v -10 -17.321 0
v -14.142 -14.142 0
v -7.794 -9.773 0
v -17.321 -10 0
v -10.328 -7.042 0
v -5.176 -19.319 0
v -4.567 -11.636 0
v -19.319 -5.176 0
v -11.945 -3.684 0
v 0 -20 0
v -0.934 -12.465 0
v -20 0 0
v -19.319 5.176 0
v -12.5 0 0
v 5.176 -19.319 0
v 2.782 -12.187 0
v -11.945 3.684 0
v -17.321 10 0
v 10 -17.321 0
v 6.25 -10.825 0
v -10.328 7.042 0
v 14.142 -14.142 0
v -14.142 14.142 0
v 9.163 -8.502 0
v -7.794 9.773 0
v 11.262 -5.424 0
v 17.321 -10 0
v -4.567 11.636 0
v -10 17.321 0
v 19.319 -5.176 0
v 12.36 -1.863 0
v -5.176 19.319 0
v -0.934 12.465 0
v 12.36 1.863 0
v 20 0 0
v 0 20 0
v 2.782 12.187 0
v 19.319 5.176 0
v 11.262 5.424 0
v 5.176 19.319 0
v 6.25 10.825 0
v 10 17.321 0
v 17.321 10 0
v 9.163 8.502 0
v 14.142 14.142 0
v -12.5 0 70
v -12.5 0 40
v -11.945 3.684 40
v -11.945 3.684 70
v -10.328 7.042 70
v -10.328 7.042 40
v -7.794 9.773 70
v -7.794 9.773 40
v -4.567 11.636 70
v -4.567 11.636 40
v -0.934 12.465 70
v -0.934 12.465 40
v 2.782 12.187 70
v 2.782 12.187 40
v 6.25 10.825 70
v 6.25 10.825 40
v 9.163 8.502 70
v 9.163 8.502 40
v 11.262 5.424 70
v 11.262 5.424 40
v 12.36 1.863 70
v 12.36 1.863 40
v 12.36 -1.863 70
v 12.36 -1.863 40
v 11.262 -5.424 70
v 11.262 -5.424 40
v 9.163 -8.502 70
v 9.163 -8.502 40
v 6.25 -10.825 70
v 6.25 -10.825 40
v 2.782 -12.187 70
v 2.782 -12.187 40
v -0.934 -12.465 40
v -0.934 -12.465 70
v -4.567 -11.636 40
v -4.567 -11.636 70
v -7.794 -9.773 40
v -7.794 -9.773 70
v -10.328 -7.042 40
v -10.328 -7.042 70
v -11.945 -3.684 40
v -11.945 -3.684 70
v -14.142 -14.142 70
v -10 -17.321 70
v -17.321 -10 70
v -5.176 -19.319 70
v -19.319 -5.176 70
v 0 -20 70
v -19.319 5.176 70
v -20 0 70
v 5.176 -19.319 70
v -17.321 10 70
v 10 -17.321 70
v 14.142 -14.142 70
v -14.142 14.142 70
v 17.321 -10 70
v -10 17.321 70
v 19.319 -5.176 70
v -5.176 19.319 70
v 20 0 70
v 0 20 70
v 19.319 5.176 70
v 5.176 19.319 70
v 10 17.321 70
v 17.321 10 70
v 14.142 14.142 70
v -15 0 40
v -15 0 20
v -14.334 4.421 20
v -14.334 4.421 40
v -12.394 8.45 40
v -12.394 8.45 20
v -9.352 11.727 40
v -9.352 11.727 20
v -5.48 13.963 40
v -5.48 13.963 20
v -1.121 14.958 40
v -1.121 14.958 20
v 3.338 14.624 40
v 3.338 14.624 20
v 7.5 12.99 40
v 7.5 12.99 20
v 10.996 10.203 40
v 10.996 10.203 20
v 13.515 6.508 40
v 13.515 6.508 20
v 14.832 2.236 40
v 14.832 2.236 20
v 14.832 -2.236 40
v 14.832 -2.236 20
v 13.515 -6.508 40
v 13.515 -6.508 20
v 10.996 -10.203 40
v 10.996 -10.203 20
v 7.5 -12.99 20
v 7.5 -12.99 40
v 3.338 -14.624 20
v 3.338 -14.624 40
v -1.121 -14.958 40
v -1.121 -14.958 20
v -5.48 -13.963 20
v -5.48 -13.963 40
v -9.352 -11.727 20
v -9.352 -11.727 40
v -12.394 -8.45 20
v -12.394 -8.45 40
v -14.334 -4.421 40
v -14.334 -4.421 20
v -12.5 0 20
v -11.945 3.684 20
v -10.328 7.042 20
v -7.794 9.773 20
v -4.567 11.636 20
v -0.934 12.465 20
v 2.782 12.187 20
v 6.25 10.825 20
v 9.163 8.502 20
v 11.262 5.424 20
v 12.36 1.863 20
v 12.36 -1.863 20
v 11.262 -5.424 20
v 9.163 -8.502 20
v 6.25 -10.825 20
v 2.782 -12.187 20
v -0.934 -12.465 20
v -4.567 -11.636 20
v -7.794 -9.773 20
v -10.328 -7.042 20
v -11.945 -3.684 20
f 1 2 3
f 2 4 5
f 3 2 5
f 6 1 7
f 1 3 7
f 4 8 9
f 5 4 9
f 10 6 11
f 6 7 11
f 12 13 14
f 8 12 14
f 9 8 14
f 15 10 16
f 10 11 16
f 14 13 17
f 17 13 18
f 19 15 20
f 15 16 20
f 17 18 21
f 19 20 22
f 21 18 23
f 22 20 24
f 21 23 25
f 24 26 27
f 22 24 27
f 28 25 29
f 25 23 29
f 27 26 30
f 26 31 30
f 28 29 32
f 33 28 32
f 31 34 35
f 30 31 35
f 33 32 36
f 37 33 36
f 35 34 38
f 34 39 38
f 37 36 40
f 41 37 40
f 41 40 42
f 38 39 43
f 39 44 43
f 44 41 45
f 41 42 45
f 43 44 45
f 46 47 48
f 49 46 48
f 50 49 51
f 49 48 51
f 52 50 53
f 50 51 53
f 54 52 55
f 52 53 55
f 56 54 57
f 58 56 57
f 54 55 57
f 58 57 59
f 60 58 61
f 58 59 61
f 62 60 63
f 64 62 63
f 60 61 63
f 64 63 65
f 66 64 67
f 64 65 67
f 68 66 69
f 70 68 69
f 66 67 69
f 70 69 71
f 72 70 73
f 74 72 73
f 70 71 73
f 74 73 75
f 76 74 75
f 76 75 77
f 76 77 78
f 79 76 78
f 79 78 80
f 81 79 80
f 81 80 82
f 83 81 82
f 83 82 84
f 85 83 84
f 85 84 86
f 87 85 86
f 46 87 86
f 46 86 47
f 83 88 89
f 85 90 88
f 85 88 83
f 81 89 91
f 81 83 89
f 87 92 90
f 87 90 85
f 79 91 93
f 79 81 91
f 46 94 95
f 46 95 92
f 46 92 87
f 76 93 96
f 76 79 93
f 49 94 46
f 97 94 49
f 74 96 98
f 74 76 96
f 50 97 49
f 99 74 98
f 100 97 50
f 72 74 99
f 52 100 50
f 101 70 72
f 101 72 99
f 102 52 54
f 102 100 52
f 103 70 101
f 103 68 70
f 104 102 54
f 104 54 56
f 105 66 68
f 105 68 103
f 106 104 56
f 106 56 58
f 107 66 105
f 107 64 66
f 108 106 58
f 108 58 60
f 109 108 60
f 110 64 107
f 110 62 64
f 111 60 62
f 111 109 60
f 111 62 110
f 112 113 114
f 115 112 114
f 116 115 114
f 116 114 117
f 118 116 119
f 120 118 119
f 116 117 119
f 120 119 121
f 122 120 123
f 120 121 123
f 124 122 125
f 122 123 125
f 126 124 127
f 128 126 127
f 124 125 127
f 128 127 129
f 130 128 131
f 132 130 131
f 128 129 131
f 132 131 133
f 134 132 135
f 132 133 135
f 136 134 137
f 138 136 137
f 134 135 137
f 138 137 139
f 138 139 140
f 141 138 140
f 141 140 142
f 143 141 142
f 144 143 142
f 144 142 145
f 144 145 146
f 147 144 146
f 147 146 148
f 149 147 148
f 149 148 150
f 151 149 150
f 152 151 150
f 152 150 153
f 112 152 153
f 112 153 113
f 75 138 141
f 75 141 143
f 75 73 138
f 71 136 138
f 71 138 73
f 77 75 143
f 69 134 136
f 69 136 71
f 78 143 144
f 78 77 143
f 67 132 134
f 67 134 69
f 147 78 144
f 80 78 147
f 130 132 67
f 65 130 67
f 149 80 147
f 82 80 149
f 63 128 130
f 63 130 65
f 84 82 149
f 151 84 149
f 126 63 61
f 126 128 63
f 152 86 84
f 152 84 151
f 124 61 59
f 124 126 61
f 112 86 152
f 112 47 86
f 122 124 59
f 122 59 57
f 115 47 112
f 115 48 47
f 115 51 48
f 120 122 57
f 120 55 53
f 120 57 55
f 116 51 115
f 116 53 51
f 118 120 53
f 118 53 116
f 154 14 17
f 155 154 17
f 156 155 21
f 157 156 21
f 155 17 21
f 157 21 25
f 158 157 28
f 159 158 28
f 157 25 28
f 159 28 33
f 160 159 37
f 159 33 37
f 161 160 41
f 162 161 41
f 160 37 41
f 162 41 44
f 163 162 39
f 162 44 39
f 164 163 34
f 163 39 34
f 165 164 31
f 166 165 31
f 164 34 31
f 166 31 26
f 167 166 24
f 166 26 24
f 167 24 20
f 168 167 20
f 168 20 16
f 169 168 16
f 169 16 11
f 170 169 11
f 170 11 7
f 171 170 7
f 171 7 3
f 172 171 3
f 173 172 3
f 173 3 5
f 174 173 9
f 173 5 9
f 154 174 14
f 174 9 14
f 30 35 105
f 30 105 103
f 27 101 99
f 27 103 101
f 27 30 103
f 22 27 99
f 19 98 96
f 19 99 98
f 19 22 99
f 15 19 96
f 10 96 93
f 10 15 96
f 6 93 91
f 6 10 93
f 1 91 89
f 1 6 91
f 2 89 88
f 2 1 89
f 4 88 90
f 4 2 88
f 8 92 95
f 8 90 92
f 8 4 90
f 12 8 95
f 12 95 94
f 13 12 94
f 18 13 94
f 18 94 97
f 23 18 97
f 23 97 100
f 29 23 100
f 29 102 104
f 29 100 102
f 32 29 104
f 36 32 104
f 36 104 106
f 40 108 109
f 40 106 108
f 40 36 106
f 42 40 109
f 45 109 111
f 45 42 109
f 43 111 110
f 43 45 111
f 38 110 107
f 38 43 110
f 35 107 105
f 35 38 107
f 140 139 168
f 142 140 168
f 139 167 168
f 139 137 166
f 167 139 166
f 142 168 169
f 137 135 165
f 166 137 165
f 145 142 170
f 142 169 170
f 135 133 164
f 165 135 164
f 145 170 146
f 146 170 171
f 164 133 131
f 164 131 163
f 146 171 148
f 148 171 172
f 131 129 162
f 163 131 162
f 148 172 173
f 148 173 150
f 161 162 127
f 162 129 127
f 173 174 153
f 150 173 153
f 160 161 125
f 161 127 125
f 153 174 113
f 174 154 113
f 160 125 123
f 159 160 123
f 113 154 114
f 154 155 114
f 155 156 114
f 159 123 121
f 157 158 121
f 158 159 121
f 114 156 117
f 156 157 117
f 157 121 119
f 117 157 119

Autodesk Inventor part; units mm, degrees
ref_plane "YZ Plane" through (0, 0, 0) normal (1, 0, 0) x (0, 1, 0)
ref_plane "XZ Plane" through (0, 0, 0) normal (0, 1, 0) x (-1, 0, 0)
ref_plane "XY Plane" through (0, 0, 0) normal (0, 0, 1) x (1, 0, 0)
sketch "스케치1" plane through (0, 0, 0) normal (0, 0, 1) x (1, 0, 0)
  circle A0 centre (0, 0) radius 20
  dimension "d0" = 40
extrude "돌출1" add sketch "스케치1" along normal blind 70
sketch "스케치2" plane through (0, 0, 0) normal (0, 0, -1) x (-1, 0, 0)
  circle A0 centre (0, 0) radius 12.5
  dimension "d3" = 25
extrude "돌출2" cut sketch "스케치2" against normal blind 20
sketch "스케치3" plane through (0, 0, 20) normal (0, 0, -1) x (-1, 0, 0)
  circle A0 centre (0, 0) radius 15
  dimension "d6" = 30
extrude "돌출3" cut sketch "스케치3" against normal blind 20
sketch "스케치4" plane through (0, 0, 40) normal (0, 0, -1) x (-1, 0, 0)
  circle A0 centre (0, 0) radius 12.5
  dimension "d9" = 25
extrude "돌출4" cut sketch "스케치4" against normal up to next
properties part number "기본 투상 연습3"
